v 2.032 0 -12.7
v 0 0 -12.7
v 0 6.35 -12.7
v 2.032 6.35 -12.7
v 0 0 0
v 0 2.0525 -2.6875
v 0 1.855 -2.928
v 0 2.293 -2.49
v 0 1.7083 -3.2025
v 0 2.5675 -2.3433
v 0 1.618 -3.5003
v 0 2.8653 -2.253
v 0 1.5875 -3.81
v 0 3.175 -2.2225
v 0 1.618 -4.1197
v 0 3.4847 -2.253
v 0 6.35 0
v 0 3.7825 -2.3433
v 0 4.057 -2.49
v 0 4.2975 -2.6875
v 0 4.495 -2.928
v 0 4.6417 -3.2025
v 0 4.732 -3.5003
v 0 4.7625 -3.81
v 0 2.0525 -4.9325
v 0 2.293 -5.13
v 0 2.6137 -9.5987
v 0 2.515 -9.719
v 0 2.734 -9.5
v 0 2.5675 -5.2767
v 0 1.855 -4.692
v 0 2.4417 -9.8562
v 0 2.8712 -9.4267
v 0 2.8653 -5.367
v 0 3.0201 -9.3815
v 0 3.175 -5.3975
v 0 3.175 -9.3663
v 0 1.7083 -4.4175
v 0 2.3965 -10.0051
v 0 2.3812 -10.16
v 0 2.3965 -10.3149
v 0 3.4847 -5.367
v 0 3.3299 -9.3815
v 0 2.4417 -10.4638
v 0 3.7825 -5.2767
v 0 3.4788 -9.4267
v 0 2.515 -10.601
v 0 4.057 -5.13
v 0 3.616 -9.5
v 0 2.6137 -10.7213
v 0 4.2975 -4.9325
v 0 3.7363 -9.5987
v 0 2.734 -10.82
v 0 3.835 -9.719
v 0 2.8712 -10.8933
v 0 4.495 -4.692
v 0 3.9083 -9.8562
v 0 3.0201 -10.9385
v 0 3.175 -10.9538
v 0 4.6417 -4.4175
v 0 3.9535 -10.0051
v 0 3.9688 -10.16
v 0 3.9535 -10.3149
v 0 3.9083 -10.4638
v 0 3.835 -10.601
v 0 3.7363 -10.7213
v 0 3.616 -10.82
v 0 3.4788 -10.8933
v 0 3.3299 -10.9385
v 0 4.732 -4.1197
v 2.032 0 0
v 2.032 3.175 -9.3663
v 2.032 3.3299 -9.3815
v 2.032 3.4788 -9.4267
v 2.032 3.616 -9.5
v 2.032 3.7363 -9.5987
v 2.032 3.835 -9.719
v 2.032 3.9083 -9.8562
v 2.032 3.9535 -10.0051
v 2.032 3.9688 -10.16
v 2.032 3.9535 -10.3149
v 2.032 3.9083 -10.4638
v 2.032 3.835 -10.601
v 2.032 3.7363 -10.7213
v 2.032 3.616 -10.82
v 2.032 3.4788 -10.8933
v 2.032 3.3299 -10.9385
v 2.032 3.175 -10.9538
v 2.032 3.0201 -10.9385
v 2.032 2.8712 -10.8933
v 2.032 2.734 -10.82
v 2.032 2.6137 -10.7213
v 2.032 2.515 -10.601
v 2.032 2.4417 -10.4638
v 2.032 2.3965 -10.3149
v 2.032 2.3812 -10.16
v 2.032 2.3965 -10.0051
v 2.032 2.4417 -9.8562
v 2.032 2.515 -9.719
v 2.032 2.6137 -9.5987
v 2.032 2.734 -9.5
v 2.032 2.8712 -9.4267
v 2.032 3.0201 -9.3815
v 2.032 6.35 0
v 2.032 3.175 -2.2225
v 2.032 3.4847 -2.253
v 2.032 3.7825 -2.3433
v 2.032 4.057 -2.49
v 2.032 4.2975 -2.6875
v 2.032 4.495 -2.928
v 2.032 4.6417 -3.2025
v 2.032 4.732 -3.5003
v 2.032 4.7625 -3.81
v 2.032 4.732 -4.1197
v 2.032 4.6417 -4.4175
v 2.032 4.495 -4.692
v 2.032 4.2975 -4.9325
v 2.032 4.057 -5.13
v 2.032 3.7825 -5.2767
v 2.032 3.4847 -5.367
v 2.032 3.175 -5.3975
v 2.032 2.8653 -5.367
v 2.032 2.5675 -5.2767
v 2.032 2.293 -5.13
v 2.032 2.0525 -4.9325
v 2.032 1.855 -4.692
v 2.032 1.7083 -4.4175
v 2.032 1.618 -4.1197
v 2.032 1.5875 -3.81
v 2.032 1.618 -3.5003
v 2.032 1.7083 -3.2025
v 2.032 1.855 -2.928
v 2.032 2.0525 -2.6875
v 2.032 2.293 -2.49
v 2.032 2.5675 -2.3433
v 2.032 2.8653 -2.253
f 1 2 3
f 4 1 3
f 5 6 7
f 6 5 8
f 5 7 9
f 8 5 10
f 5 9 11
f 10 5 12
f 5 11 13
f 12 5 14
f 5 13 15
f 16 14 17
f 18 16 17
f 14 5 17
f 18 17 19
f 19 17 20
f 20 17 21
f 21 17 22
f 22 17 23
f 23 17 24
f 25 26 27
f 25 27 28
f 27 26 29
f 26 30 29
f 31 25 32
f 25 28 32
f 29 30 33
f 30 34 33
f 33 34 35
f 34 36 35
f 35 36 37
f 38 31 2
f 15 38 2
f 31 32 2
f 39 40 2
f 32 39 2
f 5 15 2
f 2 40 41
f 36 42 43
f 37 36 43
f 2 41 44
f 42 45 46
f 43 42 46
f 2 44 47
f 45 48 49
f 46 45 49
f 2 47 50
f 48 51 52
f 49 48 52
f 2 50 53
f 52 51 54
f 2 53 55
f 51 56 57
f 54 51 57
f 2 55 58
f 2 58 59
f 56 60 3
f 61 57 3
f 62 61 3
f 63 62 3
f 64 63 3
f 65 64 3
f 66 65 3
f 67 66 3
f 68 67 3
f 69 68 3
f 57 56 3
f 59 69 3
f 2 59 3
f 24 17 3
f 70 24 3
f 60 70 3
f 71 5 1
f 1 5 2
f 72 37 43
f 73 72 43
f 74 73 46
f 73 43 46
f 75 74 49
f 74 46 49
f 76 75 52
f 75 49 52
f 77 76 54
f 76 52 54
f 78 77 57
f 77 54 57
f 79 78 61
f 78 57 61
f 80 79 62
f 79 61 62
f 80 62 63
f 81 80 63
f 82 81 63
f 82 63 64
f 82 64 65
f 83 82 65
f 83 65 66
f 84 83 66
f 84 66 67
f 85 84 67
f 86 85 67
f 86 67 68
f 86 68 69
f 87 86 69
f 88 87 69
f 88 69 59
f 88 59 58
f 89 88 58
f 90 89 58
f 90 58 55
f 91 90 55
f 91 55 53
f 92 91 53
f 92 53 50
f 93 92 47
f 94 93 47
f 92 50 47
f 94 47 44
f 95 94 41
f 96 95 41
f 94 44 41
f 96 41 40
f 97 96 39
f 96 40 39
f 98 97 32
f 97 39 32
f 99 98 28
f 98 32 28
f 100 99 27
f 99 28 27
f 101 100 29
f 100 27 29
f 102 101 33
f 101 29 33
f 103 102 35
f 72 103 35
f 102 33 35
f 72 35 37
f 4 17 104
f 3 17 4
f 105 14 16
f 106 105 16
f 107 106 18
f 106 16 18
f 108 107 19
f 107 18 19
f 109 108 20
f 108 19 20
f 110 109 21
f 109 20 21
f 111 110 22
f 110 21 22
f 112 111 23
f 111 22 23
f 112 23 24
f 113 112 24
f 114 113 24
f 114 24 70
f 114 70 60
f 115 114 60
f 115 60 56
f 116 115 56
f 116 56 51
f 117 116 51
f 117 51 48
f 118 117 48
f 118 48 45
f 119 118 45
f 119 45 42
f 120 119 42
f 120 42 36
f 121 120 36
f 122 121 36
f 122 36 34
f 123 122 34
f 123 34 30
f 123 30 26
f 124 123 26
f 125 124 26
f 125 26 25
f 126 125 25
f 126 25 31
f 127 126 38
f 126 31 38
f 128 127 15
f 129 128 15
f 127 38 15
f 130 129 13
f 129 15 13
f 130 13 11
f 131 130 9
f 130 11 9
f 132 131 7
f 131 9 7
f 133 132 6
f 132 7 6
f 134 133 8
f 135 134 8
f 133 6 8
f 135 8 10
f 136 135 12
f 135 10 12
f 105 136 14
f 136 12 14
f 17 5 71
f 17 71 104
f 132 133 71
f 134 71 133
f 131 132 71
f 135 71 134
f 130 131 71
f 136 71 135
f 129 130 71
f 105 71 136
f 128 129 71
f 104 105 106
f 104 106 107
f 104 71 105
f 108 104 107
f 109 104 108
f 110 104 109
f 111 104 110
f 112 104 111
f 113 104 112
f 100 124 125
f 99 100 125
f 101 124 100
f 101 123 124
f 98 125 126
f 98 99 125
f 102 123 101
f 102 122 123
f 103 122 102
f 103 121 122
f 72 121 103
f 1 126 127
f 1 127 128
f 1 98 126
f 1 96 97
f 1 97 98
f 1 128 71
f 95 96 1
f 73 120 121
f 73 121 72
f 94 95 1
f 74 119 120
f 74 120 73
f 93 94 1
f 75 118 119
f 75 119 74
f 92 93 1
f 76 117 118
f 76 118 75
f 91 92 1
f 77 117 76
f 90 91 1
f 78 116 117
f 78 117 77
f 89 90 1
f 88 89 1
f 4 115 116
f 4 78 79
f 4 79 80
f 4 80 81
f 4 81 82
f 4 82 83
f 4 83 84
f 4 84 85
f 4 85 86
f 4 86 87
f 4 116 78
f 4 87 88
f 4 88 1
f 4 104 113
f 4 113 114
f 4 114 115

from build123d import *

# Parameters (mm, degrees)
SKETCH1_W                          = 12.7
SKETCH1_H                          = 6.35
BOSS_EXTRUDE1_DEPTH                = 2.032
F_1_16_0_0625_DIAMETER_HOLE1_D     = 1.5875
F_1_16_0_0625_DIAMETER_HOLE1_DEPTH = 70.104
F_1_16_0_0625_DIAMETER_HOLE1_TIP   = 0.476933116
F_1_8_0_125_DIAMETER_HOLE1_D       = 3.175
F_1_8_0_125_DIAMETER_HOLE1_DEPTH   = 70.104
F_1_8_0_125_DIAMETER_HOLE1_TIP     = 0.953866233


with BuildPart() as part:
    # Sketch1 → Boss-Extrude1 (new body)
    with BuildSketch(Plane(origin=(0, 0, 0), x_dir=(0, 0, -1), z_dir=(1, 0, 0))):
        with Locations((6.35, 3.175)):
            Rectangle(SKETCH1_W, SKETCH1_H)
    extrude(amount=BOSS_EXTRUDE1_DEPTH)

    # 1/16 (0.0625) Diameter Hole1
    with Locations(Plane(origin=(2.032, 0, 0), x_dir=(0, 0, -1), z_dir=(1, 0, 0))):
        with Locations((10.16, 3.175)):
            Hole(F_1_16_0_0625_DIAMETER_HOLE1_D / 2, depth=F_1_16_0_0625_DIAMETER_HOLE1_DEPTH)
            with Locations((0, 0, -(F_1_16_0_0625_DIAMETER_HOLE1_DEPTH + F_1_16_0_0625_DIAMETER_HOLE1_TIP / 2))):  # 118° drill point
                Cone(0, F_1_16_0_0625_DIAMETER_HOLE1_D / 2, F_1_16_0_0625_DIAMETER_HOLE1_TIP, mode=Mode.SUBTRACT)

    # 1/8 (0.125) Diameter Hole1
    with Locations(Plane(origin=(2.032, 0, 0), x_dir=(0, 0, -1), z_dir=(1, 0, 0))):
        with Locations((3.81, 3.175)):
            Hole(F_1_8_0_125_DIAMETER_HOLE1_D / 2, depth=F_1_8_0_125_DIAMETER_HOLE1_DEPTH)
            with Locations((0, 0, -(F_1_8_0_125_DIAMETER_HOLE1_DEPTH + F_1_8_0_125_DIAMETER_HOLE1_TIP / 2))):  # 118° drill point
                Cone(0, F_1_8_0_125_DIAMETER_HOLE1_D / 2, F_1_8_0_125_DIAMETER_HOLE1_TIP, mode=Mode.SUBTRACT)


solid = part.part
